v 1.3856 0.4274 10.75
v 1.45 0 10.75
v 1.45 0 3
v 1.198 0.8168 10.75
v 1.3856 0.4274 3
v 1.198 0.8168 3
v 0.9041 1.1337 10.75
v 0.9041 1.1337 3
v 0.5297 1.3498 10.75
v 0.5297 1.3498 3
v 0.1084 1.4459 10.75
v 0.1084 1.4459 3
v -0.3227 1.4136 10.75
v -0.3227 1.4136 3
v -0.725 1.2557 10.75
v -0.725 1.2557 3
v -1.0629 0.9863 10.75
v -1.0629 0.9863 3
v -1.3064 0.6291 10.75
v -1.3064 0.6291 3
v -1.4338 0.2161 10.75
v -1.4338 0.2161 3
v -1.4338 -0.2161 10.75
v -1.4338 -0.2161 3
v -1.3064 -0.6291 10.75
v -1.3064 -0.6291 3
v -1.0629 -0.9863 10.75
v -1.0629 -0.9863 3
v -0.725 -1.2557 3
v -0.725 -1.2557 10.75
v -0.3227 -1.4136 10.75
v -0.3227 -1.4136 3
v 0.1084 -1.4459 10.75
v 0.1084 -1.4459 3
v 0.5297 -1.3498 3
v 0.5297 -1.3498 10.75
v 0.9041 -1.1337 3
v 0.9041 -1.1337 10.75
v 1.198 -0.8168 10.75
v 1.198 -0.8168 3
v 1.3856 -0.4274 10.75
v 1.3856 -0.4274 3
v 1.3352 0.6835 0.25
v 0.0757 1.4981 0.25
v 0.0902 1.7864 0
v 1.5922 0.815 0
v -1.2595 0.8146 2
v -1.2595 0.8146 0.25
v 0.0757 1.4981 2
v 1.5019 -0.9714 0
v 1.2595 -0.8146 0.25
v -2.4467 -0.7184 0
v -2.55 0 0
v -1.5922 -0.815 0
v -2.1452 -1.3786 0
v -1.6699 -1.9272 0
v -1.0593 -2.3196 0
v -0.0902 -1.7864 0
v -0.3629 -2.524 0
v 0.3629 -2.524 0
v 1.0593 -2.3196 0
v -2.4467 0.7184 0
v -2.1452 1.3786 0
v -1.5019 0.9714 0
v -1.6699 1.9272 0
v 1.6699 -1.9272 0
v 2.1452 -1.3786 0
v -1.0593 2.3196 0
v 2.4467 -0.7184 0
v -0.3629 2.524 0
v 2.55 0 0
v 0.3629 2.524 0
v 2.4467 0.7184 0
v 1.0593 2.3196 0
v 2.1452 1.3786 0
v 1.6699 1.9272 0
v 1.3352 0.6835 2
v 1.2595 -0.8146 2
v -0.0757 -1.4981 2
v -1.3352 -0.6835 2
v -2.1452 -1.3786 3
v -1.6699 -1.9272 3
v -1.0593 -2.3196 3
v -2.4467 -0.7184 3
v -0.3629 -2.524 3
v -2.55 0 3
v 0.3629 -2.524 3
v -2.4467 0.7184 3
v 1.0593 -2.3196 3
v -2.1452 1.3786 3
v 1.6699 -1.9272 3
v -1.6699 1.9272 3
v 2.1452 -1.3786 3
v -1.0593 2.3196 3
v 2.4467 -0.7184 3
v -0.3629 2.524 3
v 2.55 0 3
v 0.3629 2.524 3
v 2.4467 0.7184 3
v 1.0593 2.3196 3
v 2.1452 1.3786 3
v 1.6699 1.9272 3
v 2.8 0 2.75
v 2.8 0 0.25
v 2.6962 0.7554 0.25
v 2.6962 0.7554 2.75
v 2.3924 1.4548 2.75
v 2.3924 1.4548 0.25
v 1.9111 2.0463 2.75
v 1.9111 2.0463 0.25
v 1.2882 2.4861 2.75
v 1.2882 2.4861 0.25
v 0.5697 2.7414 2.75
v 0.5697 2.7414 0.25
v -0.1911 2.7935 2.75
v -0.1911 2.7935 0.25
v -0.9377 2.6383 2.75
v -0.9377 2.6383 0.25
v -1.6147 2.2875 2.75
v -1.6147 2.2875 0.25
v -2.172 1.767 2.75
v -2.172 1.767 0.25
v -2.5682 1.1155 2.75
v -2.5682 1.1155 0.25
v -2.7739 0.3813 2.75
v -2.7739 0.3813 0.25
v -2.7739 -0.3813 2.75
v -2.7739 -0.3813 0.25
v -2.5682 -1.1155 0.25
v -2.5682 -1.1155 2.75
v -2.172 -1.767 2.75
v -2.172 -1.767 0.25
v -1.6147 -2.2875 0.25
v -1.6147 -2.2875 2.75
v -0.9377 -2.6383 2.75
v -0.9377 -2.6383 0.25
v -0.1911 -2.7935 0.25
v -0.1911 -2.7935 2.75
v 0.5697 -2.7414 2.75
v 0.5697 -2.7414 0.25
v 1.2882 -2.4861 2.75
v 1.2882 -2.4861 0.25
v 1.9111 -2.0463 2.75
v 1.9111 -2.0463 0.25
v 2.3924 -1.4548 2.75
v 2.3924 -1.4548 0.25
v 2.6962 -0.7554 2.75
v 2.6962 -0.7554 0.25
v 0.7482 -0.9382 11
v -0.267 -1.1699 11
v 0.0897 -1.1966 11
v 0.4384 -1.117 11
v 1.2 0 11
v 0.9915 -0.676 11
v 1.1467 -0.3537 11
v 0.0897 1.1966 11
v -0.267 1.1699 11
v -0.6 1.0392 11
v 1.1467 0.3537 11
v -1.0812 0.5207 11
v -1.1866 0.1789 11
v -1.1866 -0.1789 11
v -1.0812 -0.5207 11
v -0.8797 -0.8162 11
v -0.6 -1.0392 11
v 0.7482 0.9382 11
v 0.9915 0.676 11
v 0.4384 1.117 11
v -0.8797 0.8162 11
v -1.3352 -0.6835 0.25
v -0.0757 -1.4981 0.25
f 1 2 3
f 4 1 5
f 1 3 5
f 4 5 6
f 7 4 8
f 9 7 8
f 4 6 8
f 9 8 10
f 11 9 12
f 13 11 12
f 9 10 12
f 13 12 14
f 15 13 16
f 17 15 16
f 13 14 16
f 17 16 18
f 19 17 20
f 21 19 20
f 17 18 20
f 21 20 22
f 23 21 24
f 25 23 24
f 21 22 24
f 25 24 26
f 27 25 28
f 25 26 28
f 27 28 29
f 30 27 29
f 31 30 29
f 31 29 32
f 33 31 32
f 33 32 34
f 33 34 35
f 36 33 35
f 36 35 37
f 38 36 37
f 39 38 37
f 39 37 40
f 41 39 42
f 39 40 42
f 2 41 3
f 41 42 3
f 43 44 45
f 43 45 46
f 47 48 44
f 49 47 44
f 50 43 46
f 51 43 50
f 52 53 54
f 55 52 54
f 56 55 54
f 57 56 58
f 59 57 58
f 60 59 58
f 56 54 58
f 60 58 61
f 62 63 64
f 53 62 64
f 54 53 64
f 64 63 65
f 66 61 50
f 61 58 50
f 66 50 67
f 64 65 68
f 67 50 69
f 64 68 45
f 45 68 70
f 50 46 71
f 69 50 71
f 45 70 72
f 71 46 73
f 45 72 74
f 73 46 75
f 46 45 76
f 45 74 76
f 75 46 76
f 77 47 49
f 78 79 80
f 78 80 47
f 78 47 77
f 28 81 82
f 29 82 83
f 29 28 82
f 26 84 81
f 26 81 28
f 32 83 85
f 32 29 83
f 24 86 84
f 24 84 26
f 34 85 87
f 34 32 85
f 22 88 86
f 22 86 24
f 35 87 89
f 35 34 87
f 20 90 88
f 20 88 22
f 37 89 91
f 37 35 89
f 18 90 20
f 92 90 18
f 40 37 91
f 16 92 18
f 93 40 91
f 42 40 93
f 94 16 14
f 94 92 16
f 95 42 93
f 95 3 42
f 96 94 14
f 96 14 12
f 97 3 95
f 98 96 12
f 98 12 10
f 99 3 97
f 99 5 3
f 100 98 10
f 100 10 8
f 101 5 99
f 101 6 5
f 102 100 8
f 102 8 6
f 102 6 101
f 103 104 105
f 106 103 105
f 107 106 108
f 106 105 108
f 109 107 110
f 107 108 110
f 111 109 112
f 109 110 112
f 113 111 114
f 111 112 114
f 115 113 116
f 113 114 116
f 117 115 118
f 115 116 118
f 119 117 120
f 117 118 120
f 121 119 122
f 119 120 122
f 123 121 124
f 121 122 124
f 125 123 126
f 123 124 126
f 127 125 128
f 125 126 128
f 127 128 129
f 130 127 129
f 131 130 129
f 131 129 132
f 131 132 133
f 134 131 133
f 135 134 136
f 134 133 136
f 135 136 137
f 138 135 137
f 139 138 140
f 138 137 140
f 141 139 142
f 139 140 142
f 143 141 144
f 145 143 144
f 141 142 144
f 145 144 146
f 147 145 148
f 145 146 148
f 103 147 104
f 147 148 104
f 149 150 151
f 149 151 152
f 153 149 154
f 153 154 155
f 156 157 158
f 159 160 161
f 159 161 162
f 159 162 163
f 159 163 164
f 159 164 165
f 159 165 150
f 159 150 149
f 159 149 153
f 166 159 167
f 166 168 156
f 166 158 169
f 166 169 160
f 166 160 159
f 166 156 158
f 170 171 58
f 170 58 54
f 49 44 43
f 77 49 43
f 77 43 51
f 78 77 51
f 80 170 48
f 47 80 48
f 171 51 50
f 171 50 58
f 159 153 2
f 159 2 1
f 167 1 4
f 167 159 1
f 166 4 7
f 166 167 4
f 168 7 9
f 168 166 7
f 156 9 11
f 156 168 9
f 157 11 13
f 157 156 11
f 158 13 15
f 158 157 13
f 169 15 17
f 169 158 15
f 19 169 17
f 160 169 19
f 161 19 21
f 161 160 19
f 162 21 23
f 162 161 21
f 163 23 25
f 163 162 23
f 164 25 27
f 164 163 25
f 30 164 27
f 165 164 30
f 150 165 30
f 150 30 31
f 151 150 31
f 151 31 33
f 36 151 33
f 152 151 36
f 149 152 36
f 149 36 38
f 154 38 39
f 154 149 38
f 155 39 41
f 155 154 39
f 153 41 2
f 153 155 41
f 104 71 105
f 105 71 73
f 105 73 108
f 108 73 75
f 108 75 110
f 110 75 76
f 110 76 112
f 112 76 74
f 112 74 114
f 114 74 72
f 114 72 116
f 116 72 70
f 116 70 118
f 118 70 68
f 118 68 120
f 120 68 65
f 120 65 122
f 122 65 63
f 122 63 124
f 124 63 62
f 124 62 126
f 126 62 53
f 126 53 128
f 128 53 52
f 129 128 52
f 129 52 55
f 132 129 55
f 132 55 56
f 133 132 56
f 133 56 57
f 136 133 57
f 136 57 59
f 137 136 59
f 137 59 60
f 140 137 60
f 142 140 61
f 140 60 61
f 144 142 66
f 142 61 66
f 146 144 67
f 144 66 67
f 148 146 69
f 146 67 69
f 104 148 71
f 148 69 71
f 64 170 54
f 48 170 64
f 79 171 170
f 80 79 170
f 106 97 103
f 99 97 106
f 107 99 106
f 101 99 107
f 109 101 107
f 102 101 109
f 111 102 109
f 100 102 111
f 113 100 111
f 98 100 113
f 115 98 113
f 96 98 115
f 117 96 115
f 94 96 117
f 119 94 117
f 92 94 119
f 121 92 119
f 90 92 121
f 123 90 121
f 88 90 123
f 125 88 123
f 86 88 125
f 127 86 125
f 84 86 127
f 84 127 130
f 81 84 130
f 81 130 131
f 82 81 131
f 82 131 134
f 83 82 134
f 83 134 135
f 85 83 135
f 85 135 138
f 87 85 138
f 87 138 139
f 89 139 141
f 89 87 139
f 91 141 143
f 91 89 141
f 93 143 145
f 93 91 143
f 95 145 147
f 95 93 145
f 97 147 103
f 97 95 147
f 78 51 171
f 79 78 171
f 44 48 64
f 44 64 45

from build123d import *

# Parameters (mm, degrees)
SKETCH_R     = 2.8
PAD_DEPTH    = 3
SKETCH001_R  = 1.45
PAD001_DEPTH = 8
POCKET_DEPTH = 2
CHAMFER_SIZE = 0.25


with BuildPart() as part:
    # Sketch → Pad (new body)
    with BuildSketch(Plane.XY):
        Circle(SKETCH_R)
    extrude(amount=PAD_DEPTH)

    # Sketch001 (on Face3 of Pad) → Pad001 (join)
    with BuildSketch(Plane.XY.offset(3)):
        Circle(SKETCH001_R)
    extrude(amount=PAD001_DEPTH)

    # Sketch002 (on Face2 of Pad001) → Pocket (cut)
    with BuildSketch(Plane(origin=(0, 0, 0), x_dir=(1, 0, 0), z_dir=(0, 0, -1))):
        Polygon((1.259542, 0.814588), (-0.075682, 1.49809), (-1.335225, 0.683502), (-1.259542, -0.814588), (0.075682, -1.49809), (1.335225, -0.683502), align=None)
    extrude(amount=-POCKET_DEPTH, mode=Mode.SUBTRACT)

    # Chamfer
    chamfer_edges = [part.edges().sort_by_distance(p)[0] for p in [
        (-2.8, 0, 3),
        (-2.8, 0, 0),
        (1.297384, -0.065543, 0),
        (0.705454, 1.090796, 0),
        (-0.59193, 1.156339, 0),
        (-1.297384, 0.065543, 0),
        (-0.705454, -1.090796, 0),
        (0.59193, -1.156339, 0),
        (-1.45, 0, 11),
    ]]
    chamfer(chamfer_edges, length=CHAMFER_SIZE)


solid = part.part
